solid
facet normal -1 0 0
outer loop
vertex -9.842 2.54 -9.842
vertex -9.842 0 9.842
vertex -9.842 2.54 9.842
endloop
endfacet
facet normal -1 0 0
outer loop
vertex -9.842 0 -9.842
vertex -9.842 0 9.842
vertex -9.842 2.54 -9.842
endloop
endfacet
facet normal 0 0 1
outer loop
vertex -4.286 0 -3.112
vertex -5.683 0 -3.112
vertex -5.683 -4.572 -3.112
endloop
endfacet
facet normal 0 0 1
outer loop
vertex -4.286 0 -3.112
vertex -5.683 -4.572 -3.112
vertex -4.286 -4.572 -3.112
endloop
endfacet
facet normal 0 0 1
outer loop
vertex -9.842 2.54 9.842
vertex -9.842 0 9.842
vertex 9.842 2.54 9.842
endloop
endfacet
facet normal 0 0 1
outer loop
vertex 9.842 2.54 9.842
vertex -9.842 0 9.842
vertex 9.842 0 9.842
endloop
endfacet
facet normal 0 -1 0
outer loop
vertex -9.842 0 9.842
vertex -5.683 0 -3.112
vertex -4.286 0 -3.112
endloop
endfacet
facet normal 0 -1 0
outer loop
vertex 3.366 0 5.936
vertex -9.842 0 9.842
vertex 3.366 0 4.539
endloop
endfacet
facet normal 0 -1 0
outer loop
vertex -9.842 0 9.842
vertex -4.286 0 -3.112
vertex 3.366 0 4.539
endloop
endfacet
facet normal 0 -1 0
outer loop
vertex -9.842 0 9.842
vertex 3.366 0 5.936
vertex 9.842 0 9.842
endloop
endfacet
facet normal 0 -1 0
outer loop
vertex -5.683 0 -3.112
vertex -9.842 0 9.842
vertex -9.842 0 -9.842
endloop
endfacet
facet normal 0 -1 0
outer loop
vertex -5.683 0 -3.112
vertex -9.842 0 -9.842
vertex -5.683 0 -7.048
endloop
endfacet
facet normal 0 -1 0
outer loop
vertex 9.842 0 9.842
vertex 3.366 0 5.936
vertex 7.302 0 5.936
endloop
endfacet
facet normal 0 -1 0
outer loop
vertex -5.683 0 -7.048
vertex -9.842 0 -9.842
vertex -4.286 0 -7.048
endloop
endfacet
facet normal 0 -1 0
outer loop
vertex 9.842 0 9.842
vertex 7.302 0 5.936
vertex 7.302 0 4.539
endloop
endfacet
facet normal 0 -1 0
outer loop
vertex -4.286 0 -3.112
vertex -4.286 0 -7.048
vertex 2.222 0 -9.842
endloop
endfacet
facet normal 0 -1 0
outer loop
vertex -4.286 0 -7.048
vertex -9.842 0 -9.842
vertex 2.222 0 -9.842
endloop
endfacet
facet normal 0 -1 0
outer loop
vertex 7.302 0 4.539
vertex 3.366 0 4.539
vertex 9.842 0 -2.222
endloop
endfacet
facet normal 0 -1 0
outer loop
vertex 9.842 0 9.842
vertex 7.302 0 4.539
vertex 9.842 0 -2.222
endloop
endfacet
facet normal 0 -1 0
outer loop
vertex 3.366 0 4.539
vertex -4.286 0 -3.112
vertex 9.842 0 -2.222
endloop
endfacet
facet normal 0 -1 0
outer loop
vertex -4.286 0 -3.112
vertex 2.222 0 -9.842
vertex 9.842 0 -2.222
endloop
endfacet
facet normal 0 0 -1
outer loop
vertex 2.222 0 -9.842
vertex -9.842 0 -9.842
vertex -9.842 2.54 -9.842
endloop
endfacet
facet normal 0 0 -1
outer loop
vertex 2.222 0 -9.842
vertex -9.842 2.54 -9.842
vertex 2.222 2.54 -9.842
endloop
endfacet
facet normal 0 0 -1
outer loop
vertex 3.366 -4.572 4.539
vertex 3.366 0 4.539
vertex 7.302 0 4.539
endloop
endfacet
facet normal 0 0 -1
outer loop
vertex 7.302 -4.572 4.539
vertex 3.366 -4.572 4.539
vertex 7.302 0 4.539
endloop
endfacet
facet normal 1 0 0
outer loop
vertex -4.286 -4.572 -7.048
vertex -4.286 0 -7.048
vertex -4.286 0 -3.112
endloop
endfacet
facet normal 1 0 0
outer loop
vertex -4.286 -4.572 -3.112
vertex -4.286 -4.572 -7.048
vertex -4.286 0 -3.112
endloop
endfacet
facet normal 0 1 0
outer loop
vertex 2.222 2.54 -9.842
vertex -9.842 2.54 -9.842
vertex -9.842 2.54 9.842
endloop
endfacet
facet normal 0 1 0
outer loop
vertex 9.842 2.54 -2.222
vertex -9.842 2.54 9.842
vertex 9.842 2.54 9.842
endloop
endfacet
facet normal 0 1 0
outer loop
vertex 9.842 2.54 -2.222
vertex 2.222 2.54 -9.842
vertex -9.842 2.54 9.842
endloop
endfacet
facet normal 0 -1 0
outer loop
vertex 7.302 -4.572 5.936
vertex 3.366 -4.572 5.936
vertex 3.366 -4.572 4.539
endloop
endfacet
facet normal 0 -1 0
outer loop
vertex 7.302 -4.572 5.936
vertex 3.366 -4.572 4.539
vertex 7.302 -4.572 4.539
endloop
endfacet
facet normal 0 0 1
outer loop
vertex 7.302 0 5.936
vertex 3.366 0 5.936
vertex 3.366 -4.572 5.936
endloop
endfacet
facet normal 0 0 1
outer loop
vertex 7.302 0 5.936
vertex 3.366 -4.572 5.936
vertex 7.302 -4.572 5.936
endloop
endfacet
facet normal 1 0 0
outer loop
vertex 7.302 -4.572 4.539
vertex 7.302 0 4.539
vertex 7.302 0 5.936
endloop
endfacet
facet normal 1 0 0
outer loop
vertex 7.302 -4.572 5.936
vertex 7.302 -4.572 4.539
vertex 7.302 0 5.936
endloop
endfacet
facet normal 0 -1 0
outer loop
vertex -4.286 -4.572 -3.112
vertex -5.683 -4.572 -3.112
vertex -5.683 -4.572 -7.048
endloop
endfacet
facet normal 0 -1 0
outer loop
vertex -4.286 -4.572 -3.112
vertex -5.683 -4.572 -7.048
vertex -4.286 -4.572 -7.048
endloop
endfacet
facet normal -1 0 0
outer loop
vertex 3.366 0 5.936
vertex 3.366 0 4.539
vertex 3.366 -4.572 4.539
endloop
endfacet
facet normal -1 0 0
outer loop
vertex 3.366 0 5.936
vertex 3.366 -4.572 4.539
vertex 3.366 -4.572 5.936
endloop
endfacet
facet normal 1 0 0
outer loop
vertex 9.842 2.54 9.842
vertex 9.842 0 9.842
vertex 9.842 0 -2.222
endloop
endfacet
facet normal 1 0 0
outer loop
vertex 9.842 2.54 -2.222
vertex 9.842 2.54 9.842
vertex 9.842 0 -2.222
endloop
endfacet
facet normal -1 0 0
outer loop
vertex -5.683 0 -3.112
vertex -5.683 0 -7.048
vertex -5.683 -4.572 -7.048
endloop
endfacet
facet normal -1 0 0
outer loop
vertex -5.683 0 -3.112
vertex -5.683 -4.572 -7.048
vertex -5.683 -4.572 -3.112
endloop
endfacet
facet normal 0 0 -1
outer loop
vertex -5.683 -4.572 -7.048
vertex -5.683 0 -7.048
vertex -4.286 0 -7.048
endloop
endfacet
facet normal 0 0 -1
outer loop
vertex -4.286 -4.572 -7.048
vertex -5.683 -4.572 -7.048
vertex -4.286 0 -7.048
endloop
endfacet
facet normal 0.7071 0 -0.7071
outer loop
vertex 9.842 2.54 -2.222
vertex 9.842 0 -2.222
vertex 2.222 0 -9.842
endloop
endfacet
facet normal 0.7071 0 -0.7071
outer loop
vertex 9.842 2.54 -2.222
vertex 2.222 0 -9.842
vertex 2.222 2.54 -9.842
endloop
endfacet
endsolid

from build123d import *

# Parameters (mm, degrees)
SKETCH1_W           = 19.685
SKETCH1_H           = 19.685
BOSS_EXTRUDE1_DEPTH = 2.54
SKETCH3_W           = 1.397
SKETCH3_H           = 3.937
SKETCH3_W_2         = 3.937
SKETCH3_H_2         = 1.397
BOSS_EXTRUDE2_DEPTH = 4.572
CHAMFER1_SIZE       = 7.62


with BuildPart() as part:
    # Sketch1 → Boss-Extrude1 (new body)
    with BuildSketch(Plane(origin=(0, 0, 0), x_dir=(1, 0, 0), z_dir=(0, 1, 0))):
        Rectangle(SKETCH1_W, SKETCH1_H)
    extrude(amount=BOSS_EXTRUDE1_DEPTH)

    # Sketch3 → Boss-Extrude2 (add)
    with BuildSketch(Plane.XZ):
        with Locations((-4.98475, -5.08)):
            Rectangle(SKETCH3_W, SKETCH3_H)
        with Locations((5.334, 5.23748)):
            Rectangle(SKETCH3_W_2, SKETCH3_H_2)
    extrude(amount=BOSS_EXTRUDE2_DEPTH)

    # Chamfer1
    chamfer1_edges = [part.edges().sort_by_distance(p)[0] for p in [
        (9.8425, 1.27, -9.8425),
    ]]
    chamfer(chamfer1_edges, length=CHAMFER1_SIZE)


solid = part.part
